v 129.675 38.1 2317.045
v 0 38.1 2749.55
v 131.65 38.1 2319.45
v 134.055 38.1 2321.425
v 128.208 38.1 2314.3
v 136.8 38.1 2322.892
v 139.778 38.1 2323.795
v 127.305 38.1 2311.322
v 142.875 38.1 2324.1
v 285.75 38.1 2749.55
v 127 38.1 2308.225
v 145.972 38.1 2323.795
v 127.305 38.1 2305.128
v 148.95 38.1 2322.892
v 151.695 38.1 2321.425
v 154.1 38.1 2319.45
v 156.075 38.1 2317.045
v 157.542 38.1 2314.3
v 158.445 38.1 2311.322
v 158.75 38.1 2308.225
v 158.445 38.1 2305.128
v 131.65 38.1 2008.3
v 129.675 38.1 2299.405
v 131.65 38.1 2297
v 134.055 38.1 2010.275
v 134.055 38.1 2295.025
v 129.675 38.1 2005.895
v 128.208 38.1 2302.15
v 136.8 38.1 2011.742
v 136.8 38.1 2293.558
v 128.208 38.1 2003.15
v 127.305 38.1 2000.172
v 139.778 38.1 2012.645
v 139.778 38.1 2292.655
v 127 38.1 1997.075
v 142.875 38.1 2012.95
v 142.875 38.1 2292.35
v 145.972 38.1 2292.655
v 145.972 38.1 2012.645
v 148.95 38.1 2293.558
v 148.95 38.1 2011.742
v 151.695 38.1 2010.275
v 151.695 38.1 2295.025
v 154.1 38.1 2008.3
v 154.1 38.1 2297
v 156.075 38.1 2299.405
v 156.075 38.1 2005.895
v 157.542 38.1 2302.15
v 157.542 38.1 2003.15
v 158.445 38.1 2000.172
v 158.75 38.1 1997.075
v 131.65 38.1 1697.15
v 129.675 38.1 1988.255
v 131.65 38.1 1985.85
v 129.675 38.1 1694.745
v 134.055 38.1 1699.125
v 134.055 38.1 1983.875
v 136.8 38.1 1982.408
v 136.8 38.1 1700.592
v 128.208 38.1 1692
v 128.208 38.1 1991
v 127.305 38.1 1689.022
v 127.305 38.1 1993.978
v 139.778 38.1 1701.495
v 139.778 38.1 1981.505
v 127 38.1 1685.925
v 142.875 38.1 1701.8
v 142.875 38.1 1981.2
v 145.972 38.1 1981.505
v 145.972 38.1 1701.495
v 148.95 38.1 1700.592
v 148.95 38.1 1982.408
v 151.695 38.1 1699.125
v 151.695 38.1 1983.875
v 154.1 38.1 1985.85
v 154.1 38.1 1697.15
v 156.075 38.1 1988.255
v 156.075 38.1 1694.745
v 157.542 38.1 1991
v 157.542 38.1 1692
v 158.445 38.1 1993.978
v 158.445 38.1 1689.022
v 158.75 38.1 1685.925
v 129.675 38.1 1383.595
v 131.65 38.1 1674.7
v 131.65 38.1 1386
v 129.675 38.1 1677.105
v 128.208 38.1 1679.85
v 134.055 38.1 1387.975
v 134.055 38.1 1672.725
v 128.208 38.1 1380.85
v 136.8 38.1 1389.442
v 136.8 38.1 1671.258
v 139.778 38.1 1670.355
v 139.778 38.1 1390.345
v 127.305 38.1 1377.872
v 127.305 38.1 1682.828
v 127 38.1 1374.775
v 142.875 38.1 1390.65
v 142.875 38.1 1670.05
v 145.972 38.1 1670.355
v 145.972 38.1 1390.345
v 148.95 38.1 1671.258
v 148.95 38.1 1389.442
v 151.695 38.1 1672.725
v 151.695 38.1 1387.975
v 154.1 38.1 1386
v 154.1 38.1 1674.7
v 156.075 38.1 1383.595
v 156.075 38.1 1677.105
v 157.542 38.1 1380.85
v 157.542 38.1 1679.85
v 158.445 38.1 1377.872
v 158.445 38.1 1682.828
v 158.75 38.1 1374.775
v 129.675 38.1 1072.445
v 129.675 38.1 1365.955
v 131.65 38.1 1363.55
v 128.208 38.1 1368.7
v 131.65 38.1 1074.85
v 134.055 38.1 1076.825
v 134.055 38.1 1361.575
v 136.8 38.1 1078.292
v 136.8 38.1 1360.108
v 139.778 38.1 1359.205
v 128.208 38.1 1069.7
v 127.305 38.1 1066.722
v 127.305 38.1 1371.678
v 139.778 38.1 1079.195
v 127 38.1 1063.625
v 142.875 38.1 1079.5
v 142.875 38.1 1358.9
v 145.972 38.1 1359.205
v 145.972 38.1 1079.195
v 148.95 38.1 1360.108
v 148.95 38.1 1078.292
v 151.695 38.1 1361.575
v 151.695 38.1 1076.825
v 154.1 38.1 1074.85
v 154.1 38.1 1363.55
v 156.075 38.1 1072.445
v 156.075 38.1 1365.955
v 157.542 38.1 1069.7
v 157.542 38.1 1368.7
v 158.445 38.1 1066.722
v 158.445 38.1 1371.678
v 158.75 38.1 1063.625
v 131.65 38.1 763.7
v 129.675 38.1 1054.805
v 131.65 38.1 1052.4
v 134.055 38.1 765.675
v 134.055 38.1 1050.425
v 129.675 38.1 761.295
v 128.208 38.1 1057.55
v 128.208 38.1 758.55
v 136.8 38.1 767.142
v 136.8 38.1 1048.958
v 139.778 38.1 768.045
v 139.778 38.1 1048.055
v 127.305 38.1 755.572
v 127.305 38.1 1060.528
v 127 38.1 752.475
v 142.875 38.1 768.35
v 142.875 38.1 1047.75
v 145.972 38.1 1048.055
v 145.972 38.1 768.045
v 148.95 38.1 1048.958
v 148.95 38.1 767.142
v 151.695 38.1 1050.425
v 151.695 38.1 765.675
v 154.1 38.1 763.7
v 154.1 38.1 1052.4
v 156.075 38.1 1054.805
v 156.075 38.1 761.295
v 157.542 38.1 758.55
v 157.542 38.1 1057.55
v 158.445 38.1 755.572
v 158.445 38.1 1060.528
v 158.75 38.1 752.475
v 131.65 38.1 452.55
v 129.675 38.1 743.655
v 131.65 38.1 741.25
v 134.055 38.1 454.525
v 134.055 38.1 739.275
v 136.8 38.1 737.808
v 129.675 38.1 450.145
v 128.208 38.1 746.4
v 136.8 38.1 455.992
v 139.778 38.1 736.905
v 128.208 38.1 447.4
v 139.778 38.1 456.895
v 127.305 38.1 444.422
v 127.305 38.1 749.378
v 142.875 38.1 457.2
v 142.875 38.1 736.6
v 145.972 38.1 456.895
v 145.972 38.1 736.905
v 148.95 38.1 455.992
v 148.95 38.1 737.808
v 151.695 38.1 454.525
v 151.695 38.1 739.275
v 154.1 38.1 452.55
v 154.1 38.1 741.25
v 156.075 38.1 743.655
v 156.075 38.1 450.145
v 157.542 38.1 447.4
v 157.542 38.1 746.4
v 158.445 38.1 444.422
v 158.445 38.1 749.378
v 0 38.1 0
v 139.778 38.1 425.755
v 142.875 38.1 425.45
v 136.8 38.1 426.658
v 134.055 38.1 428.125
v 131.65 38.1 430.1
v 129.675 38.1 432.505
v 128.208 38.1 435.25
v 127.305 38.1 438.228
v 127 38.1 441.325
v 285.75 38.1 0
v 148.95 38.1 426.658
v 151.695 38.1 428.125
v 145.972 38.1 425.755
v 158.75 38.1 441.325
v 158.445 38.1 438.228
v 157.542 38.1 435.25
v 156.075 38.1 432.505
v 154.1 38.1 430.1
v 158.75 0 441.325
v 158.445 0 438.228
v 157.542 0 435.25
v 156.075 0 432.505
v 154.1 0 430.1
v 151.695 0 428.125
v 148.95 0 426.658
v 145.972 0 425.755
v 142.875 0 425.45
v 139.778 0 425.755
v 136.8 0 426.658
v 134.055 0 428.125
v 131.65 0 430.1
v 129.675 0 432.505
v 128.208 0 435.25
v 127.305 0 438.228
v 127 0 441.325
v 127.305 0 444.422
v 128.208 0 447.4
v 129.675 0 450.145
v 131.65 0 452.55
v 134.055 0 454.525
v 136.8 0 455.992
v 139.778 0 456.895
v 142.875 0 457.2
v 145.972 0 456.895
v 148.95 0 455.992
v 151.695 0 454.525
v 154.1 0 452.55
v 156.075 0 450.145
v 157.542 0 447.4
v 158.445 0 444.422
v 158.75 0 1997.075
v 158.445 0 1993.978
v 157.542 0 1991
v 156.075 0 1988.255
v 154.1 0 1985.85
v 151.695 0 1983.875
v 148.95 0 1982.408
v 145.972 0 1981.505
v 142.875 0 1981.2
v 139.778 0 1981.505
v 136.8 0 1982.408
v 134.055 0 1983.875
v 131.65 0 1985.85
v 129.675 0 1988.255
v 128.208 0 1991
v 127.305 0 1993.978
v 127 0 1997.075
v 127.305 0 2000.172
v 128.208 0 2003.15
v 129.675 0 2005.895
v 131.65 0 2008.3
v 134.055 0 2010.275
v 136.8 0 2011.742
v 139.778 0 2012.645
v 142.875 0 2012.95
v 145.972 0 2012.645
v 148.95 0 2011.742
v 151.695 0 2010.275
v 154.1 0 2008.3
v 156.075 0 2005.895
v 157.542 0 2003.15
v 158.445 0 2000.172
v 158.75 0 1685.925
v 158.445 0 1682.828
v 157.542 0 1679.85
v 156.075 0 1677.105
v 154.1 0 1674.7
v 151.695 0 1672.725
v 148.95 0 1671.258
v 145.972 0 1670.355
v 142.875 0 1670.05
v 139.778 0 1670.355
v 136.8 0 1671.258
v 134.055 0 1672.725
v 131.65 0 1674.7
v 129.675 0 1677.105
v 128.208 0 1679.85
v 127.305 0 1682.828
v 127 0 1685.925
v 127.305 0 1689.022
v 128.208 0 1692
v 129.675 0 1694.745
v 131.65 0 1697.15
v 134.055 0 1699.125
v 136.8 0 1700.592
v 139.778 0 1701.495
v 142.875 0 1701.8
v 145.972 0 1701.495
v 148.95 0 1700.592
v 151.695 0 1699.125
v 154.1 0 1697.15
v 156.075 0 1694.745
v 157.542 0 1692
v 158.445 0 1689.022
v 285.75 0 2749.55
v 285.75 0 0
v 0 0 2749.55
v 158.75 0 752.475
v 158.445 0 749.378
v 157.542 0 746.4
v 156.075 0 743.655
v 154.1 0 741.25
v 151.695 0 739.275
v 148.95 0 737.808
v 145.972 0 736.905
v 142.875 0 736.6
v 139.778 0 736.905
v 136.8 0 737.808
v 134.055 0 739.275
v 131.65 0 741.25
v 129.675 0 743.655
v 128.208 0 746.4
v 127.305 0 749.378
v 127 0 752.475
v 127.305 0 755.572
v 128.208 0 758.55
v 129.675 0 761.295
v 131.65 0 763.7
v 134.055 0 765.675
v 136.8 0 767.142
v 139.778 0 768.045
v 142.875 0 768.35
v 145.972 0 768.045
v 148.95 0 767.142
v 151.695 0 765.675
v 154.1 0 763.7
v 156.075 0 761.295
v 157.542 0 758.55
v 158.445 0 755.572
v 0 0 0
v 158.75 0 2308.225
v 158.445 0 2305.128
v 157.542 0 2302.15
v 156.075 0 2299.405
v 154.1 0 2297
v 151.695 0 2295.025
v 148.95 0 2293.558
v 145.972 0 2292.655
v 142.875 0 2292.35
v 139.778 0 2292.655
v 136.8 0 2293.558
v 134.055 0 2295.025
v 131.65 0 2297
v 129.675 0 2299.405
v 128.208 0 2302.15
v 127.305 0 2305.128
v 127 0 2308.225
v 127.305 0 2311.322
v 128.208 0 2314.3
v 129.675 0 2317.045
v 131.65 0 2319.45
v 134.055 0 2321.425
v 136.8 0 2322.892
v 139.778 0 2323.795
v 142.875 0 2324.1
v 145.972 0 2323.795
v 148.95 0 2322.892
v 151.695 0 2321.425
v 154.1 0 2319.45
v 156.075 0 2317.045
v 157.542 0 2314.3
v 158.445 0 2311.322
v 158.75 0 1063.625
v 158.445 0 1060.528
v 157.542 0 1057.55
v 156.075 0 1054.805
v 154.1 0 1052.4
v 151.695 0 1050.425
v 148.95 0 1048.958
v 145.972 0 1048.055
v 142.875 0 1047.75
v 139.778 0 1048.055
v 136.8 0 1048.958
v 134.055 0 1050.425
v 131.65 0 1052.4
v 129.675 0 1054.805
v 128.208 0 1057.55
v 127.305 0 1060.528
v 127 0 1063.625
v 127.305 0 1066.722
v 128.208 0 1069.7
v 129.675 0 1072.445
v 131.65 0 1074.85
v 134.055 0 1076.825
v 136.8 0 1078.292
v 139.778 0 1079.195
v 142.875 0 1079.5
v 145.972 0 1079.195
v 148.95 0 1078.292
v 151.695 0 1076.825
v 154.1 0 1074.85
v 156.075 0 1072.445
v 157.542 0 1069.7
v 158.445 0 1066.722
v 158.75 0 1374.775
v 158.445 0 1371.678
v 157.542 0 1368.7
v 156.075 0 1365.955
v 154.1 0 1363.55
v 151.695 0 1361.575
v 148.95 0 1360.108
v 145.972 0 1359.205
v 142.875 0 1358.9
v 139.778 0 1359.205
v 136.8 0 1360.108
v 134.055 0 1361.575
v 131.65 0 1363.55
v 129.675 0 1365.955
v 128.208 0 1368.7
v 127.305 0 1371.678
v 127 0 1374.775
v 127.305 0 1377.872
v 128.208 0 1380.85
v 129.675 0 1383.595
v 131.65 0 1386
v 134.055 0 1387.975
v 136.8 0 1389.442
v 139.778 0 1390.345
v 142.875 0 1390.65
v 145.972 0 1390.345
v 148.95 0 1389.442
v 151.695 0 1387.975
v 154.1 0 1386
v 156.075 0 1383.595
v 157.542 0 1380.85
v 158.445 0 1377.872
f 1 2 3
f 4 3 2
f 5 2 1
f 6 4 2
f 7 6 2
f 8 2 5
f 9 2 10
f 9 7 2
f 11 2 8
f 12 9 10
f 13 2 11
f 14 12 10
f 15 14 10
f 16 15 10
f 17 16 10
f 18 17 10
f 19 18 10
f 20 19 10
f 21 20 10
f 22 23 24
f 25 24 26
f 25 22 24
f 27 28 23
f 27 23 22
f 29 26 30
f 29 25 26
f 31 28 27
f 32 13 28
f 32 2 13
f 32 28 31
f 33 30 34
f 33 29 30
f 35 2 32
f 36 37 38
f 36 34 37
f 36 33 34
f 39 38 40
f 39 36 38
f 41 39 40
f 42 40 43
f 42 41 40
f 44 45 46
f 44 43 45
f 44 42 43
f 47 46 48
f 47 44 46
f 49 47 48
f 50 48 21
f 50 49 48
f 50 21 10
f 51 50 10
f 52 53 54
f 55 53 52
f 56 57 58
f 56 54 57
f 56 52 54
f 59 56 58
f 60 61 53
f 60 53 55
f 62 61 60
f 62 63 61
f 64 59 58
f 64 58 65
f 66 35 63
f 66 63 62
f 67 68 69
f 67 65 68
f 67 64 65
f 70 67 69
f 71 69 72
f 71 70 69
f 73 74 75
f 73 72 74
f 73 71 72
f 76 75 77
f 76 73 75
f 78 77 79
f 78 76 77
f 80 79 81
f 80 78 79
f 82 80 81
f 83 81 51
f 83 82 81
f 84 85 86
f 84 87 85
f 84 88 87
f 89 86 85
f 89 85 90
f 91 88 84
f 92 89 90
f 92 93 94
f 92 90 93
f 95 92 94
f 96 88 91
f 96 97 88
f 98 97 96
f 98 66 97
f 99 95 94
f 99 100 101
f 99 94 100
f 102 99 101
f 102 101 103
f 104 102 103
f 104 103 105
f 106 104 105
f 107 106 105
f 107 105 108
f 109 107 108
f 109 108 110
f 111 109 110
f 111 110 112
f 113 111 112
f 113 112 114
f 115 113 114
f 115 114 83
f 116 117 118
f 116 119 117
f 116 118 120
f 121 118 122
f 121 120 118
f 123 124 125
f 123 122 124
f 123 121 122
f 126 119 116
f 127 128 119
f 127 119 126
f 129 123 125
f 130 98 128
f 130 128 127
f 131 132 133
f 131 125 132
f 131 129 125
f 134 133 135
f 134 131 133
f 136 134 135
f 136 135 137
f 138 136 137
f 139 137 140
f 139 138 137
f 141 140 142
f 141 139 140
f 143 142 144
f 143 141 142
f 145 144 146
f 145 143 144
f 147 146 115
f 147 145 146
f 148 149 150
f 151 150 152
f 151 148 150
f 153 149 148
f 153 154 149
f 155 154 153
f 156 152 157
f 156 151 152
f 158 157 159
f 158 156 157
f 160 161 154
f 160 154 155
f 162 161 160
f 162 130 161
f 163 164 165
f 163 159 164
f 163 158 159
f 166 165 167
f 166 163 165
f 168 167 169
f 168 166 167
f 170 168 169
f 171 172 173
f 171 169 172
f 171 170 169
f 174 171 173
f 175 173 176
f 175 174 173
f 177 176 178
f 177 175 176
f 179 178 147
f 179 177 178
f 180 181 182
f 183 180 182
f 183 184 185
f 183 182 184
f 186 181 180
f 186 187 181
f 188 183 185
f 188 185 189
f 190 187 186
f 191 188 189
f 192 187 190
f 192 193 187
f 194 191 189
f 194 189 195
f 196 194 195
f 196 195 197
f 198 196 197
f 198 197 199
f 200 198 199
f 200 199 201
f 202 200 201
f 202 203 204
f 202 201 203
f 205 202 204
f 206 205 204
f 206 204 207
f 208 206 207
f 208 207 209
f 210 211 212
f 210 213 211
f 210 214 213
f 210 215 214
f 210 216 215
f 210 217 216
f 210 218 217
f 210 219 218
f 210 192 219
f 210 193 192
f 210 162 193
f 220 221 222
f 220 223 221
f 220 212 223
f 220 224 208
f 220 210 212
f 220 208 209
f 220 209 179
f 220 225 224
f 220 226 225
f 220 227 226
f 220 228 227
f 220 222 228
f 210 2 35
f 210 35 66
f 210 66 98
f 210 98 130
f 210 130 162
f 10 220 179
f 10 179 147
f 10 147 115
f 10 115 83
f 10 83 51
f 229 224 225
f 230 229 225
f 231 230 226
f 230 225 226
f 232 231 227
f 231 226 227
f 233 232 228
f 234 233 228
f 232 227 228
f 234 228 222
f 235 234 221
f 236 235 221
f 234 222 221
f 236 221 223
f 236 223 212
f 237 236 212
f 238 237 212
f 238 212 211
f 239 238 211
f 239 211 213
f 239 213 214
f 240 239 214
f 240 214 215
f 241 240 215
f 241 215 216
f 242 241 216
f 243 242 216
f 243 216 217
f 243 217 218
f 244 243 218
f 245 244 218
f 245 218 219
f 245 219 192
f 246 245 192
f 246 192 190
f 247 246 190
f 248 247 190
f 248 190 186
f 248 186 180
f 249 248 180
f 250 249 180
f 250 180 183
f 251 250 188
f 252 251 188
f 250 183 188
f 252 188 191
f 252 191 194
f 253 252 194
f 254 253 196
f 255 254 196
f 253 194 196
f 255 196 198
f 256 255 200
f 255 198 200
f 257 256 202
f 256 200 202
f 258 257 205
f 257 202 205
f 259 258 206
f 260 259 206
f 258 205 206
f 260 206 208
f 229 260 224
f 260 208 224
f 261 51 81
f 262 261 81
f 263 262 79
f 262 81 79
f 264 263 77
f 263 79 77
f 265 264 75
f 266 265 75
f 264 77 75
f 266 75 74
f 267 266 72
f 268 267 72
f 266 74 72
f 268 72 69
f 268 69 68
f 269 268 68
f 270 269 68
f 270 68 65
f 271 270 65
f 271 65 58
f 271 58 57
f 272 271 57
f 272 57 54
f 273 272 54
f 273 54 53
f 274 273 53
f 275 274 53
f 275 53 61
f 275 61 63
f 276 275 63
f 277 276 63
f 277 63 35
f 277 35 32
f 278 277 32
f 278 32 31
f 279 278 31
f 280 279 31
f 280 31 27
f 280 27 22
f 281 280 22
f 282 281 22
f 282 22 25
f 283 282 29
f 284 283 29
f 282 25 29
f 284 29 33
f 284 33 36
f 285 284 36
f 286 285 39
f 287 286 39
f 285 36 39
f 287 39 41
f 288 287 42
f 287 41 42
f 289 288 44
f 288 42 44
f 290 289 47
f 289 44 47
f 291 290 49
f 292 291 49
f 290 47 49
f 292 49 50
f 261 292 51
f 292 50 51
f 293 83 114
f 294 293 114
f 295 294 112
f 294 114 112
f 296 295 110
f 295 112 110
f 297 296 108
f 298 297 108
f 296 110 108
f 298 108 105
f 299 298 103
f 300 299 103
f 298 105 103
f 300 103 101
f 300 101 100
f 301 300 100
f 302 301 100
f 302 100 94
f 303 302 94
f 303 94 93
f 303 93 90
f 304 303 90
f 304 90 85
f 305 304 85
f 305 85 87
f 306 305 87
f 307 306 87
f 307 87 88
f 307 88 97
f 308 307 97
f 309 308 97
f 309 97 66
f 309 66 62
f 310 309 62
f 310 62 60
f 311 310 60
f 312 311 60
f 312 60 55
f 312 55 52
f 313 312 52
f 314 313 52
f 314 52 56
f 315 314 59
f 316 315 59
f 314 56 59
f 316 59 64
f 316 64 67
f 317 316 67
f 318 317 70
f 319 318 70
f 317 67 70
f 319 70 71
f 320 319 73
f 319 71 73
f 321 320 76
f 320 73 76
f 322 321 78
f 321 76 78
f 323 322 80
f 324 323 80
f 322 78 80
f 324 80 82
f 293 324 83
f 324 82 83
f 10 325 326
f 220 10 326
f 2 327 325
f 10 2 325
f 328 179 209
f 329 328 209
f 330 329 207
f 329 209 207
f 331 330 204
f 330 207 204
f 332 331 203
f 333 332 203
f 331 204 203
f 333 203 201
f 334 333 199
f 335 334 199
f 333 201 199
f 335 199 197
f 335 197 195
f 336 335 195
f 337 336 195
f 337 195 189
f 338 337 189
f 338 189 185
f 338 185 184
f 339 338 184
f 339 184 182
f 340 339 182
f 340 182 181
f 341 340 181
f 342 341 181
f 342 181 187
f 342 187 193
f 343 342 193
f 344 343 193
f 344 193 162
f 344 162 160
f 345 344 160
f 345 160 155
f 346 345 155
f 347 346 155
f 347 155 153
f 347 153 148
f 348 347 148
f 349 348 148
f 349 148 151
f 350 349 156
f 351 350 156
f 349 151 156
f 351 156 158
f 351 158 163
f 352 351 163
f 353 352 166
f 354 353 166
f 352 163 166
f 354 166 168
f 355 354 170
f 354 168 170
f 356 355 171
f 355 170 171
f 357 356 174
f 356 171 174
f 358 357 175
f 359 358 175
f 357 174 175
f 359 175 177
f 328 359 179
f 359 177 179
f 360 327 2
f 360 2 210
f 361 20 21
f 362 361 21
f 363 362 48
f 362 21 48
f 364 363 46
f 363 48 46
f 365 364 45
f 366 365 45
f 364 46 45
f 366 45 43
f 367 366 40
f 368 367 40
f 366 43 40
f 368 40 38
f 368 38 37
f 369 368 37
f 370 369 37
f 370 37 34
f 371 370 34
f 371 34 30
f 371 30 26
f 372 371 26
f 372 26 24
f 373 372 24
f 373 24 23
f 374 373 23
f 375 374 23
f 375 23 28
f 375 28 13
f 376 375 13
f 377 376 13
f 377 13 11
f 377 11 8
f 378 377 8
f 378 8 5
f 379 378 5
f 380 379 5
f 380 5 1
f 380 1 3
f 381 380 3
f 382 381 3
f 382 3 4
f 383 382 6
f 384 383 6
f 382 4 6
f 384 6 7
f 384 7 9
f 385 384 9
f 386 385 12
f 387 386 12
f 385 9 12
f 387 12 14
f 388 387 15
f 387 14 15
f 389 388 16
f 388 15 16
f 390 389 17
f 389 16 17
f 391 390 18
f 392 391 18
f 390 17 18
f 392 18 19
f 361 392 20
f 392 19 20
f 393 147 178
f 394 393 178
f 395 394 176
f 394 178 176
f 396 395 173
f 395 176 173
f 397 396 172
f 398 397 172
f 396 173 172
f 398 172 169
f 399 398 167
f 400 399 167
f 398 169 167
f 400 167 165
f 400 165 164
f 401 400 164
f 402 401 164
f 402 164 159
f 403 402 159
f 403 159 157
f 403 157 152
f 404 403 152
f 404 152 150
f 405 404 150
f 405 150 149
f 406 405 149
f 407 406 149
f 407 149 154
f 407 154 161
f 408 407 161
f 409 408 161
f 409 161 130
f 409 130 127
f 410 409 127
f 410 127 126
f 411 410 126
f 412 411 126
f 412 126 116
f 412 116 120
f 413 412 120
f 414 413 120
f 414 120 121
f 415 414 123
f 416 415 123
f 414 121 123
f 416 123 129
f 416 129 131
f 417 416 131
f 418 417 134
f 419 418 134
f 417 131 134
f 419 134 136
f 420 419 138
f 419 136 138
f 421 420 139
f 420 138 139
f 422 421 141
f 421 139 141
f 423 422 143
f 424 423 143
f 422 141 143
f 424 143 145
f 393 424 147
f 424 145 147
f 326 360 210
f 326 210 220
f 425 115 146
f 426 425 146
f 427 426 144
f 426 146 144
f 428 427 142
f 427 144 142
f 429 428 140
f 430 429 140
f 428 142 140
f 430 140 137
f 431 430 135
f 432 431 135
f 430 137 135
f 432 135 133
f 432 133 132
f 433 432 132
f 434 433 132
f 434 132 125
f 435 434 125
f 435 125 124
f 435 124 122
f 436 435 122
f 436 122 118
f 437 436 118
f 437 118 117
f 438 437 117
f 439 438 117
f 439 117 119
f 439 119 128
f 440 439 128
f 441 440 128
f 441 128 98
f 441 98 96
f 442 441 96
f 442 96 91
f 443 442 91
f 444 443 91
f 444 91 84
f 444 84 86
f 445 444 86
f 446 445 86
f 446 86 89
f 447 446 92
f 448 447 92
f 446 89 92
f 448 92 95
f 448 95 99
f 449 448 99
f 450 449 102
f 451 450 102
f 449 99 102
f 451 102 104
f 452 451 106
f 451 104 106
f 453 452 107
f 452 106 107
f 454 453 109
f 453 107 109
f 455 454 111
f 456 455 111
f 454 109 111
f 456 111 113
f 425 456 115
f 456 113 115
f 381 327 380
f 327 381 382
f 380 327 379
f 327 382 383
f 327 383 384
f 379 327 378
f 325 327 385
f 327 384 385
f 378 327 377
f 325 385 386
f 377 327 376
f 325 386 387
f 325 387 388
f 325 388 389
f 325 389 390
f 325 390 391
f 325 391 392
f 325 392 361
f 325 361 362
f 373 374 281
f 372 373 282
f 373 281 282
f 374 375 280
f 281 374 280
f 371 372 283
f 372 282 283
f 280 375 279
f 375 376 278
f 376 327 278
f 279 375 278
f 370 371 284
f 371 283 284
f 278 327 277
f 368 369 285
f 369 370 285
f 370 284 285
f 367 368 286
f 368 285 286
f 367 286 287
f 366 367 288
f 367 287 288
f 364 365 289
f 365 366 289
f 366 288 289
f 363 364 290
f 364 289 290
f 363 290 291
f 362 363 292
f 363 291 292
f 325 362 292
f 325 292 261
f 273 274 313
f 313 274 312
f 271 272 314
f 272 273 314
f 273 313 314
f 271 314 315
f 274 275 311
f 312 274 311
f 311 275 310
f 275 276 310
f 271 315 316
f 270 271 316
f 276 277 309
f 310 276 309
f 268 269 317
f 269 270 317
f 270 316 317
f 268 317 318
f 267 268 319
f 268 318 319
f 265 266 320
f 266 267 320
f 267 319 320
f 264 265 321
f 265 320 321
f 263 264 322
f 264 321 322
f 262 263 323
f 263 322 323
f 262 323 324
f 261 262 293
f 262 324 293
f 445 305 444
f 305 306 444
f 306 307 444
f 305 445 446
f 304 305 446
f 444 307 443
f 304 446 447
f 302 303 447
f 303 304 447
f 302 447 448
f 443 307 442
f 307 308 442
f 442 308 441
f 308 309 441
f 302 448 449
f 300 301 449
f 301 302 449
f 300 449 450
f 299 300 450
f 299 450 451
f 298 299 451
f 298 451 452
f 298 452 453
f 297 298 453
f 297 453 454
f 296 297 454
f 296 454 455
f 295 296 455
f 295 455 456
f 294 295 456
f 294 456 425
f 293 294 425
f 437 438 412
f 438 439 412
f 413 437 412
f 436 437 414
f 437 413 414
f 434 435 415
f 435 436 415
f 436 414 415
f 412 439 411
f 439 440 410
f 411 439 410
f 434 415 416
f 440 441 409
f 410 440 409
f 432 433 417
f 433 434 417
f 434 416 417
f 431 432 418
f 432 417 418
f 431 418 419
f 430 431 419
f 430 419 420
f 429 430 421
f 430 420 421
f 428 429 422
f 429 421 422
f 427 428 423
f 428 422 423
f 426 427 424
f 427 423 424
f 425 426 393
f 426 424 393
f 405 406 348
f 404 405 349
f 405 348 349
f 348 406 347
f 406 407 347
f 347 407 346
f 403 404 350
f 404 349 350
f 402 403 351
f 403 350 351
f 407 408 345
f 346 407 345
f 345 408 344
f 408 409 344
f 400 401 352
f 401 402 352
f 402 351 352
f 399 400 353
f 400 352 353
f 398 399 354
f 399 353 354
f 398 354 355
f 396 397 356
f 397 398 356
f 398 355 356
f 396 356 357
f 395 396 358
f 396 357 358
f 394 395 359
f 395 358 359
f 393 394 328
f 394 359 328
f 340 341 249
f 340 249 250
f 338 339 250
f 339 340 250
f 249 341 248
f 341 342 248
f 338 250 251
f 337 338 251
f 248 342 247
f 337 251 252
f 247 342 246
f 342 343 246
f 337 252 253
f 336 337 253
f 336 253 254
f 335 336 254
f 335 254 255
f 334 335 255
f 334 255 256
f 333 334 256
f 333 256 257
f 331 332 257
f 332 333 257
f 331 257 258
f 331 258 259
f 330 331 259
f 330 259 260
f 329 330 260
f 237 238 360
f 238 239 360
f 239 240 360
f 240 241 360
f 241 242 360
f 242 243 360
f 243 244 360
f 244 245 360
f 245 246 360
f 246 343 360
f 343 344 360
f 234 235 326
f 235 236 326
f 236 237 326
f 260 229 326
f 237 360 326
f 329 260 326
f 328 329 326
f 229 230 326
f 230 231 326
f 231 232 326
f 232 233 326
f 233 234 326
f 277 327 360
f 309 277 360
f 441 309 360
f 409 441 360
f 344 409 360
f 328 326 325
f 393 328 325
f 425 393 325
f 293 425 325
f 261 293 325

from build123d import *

# Parameters (mm, degrees)
SKETCH1_W           = 285.75
SKETCH1_H           = 2749.55
BOSS_EXTRUDE1_DEPTH = 38.1
SKETCH3_R           = 15.875
CUT_EXTRUDE1_DEPTH  = 39.1


with BuildPart() as part:
    # Sketch1 → Boss-Extrude1 (new body)
    with BuildSketch(Plane(origin=(0, 0, 0), x_dir=(1, 0, 0), z_dir=(0, 1, 0))):
        with Locations((142.875, -1374.775)):
            Rectangle(SKETCH1_W, SKETCH1_H)
    extrude(amount=BOSS_EXTRUDE1_DEPTH)

    # Sketch3 → Cut-Extrude1 (cut, through all)
    with BuildSketch(Plane(origin=(0, 38.1, 0), x_dir=(1, 0, 0), z_dir=(0, 1, 0))):
        with Locations((142.875, -2308.225)):
            Circle(SKETCH3_R)
        with Locations((142.875, -1997.075)):
            Circle(SKETCH3_R)
        with Locations((142.875, -1685.925)):
            Circle(SKETCH3_R)
        with Locations((142.875, -1374.775)):
            Circle(SKETCH3_R)
        with Locations((142.875, -1063.625)):
            Circle(SKETCH3_R)
        with Locations((142.875, -752.475)):
            Circle(SKETCH3_R)
        with Locations((142.875, -441.325)):
            Circle(SKETCH3_R)
    extrude(amount=-CUT_EXTRUDE1_DEPTH, mode=Mode.SUBTRACT)


solid = part.part
